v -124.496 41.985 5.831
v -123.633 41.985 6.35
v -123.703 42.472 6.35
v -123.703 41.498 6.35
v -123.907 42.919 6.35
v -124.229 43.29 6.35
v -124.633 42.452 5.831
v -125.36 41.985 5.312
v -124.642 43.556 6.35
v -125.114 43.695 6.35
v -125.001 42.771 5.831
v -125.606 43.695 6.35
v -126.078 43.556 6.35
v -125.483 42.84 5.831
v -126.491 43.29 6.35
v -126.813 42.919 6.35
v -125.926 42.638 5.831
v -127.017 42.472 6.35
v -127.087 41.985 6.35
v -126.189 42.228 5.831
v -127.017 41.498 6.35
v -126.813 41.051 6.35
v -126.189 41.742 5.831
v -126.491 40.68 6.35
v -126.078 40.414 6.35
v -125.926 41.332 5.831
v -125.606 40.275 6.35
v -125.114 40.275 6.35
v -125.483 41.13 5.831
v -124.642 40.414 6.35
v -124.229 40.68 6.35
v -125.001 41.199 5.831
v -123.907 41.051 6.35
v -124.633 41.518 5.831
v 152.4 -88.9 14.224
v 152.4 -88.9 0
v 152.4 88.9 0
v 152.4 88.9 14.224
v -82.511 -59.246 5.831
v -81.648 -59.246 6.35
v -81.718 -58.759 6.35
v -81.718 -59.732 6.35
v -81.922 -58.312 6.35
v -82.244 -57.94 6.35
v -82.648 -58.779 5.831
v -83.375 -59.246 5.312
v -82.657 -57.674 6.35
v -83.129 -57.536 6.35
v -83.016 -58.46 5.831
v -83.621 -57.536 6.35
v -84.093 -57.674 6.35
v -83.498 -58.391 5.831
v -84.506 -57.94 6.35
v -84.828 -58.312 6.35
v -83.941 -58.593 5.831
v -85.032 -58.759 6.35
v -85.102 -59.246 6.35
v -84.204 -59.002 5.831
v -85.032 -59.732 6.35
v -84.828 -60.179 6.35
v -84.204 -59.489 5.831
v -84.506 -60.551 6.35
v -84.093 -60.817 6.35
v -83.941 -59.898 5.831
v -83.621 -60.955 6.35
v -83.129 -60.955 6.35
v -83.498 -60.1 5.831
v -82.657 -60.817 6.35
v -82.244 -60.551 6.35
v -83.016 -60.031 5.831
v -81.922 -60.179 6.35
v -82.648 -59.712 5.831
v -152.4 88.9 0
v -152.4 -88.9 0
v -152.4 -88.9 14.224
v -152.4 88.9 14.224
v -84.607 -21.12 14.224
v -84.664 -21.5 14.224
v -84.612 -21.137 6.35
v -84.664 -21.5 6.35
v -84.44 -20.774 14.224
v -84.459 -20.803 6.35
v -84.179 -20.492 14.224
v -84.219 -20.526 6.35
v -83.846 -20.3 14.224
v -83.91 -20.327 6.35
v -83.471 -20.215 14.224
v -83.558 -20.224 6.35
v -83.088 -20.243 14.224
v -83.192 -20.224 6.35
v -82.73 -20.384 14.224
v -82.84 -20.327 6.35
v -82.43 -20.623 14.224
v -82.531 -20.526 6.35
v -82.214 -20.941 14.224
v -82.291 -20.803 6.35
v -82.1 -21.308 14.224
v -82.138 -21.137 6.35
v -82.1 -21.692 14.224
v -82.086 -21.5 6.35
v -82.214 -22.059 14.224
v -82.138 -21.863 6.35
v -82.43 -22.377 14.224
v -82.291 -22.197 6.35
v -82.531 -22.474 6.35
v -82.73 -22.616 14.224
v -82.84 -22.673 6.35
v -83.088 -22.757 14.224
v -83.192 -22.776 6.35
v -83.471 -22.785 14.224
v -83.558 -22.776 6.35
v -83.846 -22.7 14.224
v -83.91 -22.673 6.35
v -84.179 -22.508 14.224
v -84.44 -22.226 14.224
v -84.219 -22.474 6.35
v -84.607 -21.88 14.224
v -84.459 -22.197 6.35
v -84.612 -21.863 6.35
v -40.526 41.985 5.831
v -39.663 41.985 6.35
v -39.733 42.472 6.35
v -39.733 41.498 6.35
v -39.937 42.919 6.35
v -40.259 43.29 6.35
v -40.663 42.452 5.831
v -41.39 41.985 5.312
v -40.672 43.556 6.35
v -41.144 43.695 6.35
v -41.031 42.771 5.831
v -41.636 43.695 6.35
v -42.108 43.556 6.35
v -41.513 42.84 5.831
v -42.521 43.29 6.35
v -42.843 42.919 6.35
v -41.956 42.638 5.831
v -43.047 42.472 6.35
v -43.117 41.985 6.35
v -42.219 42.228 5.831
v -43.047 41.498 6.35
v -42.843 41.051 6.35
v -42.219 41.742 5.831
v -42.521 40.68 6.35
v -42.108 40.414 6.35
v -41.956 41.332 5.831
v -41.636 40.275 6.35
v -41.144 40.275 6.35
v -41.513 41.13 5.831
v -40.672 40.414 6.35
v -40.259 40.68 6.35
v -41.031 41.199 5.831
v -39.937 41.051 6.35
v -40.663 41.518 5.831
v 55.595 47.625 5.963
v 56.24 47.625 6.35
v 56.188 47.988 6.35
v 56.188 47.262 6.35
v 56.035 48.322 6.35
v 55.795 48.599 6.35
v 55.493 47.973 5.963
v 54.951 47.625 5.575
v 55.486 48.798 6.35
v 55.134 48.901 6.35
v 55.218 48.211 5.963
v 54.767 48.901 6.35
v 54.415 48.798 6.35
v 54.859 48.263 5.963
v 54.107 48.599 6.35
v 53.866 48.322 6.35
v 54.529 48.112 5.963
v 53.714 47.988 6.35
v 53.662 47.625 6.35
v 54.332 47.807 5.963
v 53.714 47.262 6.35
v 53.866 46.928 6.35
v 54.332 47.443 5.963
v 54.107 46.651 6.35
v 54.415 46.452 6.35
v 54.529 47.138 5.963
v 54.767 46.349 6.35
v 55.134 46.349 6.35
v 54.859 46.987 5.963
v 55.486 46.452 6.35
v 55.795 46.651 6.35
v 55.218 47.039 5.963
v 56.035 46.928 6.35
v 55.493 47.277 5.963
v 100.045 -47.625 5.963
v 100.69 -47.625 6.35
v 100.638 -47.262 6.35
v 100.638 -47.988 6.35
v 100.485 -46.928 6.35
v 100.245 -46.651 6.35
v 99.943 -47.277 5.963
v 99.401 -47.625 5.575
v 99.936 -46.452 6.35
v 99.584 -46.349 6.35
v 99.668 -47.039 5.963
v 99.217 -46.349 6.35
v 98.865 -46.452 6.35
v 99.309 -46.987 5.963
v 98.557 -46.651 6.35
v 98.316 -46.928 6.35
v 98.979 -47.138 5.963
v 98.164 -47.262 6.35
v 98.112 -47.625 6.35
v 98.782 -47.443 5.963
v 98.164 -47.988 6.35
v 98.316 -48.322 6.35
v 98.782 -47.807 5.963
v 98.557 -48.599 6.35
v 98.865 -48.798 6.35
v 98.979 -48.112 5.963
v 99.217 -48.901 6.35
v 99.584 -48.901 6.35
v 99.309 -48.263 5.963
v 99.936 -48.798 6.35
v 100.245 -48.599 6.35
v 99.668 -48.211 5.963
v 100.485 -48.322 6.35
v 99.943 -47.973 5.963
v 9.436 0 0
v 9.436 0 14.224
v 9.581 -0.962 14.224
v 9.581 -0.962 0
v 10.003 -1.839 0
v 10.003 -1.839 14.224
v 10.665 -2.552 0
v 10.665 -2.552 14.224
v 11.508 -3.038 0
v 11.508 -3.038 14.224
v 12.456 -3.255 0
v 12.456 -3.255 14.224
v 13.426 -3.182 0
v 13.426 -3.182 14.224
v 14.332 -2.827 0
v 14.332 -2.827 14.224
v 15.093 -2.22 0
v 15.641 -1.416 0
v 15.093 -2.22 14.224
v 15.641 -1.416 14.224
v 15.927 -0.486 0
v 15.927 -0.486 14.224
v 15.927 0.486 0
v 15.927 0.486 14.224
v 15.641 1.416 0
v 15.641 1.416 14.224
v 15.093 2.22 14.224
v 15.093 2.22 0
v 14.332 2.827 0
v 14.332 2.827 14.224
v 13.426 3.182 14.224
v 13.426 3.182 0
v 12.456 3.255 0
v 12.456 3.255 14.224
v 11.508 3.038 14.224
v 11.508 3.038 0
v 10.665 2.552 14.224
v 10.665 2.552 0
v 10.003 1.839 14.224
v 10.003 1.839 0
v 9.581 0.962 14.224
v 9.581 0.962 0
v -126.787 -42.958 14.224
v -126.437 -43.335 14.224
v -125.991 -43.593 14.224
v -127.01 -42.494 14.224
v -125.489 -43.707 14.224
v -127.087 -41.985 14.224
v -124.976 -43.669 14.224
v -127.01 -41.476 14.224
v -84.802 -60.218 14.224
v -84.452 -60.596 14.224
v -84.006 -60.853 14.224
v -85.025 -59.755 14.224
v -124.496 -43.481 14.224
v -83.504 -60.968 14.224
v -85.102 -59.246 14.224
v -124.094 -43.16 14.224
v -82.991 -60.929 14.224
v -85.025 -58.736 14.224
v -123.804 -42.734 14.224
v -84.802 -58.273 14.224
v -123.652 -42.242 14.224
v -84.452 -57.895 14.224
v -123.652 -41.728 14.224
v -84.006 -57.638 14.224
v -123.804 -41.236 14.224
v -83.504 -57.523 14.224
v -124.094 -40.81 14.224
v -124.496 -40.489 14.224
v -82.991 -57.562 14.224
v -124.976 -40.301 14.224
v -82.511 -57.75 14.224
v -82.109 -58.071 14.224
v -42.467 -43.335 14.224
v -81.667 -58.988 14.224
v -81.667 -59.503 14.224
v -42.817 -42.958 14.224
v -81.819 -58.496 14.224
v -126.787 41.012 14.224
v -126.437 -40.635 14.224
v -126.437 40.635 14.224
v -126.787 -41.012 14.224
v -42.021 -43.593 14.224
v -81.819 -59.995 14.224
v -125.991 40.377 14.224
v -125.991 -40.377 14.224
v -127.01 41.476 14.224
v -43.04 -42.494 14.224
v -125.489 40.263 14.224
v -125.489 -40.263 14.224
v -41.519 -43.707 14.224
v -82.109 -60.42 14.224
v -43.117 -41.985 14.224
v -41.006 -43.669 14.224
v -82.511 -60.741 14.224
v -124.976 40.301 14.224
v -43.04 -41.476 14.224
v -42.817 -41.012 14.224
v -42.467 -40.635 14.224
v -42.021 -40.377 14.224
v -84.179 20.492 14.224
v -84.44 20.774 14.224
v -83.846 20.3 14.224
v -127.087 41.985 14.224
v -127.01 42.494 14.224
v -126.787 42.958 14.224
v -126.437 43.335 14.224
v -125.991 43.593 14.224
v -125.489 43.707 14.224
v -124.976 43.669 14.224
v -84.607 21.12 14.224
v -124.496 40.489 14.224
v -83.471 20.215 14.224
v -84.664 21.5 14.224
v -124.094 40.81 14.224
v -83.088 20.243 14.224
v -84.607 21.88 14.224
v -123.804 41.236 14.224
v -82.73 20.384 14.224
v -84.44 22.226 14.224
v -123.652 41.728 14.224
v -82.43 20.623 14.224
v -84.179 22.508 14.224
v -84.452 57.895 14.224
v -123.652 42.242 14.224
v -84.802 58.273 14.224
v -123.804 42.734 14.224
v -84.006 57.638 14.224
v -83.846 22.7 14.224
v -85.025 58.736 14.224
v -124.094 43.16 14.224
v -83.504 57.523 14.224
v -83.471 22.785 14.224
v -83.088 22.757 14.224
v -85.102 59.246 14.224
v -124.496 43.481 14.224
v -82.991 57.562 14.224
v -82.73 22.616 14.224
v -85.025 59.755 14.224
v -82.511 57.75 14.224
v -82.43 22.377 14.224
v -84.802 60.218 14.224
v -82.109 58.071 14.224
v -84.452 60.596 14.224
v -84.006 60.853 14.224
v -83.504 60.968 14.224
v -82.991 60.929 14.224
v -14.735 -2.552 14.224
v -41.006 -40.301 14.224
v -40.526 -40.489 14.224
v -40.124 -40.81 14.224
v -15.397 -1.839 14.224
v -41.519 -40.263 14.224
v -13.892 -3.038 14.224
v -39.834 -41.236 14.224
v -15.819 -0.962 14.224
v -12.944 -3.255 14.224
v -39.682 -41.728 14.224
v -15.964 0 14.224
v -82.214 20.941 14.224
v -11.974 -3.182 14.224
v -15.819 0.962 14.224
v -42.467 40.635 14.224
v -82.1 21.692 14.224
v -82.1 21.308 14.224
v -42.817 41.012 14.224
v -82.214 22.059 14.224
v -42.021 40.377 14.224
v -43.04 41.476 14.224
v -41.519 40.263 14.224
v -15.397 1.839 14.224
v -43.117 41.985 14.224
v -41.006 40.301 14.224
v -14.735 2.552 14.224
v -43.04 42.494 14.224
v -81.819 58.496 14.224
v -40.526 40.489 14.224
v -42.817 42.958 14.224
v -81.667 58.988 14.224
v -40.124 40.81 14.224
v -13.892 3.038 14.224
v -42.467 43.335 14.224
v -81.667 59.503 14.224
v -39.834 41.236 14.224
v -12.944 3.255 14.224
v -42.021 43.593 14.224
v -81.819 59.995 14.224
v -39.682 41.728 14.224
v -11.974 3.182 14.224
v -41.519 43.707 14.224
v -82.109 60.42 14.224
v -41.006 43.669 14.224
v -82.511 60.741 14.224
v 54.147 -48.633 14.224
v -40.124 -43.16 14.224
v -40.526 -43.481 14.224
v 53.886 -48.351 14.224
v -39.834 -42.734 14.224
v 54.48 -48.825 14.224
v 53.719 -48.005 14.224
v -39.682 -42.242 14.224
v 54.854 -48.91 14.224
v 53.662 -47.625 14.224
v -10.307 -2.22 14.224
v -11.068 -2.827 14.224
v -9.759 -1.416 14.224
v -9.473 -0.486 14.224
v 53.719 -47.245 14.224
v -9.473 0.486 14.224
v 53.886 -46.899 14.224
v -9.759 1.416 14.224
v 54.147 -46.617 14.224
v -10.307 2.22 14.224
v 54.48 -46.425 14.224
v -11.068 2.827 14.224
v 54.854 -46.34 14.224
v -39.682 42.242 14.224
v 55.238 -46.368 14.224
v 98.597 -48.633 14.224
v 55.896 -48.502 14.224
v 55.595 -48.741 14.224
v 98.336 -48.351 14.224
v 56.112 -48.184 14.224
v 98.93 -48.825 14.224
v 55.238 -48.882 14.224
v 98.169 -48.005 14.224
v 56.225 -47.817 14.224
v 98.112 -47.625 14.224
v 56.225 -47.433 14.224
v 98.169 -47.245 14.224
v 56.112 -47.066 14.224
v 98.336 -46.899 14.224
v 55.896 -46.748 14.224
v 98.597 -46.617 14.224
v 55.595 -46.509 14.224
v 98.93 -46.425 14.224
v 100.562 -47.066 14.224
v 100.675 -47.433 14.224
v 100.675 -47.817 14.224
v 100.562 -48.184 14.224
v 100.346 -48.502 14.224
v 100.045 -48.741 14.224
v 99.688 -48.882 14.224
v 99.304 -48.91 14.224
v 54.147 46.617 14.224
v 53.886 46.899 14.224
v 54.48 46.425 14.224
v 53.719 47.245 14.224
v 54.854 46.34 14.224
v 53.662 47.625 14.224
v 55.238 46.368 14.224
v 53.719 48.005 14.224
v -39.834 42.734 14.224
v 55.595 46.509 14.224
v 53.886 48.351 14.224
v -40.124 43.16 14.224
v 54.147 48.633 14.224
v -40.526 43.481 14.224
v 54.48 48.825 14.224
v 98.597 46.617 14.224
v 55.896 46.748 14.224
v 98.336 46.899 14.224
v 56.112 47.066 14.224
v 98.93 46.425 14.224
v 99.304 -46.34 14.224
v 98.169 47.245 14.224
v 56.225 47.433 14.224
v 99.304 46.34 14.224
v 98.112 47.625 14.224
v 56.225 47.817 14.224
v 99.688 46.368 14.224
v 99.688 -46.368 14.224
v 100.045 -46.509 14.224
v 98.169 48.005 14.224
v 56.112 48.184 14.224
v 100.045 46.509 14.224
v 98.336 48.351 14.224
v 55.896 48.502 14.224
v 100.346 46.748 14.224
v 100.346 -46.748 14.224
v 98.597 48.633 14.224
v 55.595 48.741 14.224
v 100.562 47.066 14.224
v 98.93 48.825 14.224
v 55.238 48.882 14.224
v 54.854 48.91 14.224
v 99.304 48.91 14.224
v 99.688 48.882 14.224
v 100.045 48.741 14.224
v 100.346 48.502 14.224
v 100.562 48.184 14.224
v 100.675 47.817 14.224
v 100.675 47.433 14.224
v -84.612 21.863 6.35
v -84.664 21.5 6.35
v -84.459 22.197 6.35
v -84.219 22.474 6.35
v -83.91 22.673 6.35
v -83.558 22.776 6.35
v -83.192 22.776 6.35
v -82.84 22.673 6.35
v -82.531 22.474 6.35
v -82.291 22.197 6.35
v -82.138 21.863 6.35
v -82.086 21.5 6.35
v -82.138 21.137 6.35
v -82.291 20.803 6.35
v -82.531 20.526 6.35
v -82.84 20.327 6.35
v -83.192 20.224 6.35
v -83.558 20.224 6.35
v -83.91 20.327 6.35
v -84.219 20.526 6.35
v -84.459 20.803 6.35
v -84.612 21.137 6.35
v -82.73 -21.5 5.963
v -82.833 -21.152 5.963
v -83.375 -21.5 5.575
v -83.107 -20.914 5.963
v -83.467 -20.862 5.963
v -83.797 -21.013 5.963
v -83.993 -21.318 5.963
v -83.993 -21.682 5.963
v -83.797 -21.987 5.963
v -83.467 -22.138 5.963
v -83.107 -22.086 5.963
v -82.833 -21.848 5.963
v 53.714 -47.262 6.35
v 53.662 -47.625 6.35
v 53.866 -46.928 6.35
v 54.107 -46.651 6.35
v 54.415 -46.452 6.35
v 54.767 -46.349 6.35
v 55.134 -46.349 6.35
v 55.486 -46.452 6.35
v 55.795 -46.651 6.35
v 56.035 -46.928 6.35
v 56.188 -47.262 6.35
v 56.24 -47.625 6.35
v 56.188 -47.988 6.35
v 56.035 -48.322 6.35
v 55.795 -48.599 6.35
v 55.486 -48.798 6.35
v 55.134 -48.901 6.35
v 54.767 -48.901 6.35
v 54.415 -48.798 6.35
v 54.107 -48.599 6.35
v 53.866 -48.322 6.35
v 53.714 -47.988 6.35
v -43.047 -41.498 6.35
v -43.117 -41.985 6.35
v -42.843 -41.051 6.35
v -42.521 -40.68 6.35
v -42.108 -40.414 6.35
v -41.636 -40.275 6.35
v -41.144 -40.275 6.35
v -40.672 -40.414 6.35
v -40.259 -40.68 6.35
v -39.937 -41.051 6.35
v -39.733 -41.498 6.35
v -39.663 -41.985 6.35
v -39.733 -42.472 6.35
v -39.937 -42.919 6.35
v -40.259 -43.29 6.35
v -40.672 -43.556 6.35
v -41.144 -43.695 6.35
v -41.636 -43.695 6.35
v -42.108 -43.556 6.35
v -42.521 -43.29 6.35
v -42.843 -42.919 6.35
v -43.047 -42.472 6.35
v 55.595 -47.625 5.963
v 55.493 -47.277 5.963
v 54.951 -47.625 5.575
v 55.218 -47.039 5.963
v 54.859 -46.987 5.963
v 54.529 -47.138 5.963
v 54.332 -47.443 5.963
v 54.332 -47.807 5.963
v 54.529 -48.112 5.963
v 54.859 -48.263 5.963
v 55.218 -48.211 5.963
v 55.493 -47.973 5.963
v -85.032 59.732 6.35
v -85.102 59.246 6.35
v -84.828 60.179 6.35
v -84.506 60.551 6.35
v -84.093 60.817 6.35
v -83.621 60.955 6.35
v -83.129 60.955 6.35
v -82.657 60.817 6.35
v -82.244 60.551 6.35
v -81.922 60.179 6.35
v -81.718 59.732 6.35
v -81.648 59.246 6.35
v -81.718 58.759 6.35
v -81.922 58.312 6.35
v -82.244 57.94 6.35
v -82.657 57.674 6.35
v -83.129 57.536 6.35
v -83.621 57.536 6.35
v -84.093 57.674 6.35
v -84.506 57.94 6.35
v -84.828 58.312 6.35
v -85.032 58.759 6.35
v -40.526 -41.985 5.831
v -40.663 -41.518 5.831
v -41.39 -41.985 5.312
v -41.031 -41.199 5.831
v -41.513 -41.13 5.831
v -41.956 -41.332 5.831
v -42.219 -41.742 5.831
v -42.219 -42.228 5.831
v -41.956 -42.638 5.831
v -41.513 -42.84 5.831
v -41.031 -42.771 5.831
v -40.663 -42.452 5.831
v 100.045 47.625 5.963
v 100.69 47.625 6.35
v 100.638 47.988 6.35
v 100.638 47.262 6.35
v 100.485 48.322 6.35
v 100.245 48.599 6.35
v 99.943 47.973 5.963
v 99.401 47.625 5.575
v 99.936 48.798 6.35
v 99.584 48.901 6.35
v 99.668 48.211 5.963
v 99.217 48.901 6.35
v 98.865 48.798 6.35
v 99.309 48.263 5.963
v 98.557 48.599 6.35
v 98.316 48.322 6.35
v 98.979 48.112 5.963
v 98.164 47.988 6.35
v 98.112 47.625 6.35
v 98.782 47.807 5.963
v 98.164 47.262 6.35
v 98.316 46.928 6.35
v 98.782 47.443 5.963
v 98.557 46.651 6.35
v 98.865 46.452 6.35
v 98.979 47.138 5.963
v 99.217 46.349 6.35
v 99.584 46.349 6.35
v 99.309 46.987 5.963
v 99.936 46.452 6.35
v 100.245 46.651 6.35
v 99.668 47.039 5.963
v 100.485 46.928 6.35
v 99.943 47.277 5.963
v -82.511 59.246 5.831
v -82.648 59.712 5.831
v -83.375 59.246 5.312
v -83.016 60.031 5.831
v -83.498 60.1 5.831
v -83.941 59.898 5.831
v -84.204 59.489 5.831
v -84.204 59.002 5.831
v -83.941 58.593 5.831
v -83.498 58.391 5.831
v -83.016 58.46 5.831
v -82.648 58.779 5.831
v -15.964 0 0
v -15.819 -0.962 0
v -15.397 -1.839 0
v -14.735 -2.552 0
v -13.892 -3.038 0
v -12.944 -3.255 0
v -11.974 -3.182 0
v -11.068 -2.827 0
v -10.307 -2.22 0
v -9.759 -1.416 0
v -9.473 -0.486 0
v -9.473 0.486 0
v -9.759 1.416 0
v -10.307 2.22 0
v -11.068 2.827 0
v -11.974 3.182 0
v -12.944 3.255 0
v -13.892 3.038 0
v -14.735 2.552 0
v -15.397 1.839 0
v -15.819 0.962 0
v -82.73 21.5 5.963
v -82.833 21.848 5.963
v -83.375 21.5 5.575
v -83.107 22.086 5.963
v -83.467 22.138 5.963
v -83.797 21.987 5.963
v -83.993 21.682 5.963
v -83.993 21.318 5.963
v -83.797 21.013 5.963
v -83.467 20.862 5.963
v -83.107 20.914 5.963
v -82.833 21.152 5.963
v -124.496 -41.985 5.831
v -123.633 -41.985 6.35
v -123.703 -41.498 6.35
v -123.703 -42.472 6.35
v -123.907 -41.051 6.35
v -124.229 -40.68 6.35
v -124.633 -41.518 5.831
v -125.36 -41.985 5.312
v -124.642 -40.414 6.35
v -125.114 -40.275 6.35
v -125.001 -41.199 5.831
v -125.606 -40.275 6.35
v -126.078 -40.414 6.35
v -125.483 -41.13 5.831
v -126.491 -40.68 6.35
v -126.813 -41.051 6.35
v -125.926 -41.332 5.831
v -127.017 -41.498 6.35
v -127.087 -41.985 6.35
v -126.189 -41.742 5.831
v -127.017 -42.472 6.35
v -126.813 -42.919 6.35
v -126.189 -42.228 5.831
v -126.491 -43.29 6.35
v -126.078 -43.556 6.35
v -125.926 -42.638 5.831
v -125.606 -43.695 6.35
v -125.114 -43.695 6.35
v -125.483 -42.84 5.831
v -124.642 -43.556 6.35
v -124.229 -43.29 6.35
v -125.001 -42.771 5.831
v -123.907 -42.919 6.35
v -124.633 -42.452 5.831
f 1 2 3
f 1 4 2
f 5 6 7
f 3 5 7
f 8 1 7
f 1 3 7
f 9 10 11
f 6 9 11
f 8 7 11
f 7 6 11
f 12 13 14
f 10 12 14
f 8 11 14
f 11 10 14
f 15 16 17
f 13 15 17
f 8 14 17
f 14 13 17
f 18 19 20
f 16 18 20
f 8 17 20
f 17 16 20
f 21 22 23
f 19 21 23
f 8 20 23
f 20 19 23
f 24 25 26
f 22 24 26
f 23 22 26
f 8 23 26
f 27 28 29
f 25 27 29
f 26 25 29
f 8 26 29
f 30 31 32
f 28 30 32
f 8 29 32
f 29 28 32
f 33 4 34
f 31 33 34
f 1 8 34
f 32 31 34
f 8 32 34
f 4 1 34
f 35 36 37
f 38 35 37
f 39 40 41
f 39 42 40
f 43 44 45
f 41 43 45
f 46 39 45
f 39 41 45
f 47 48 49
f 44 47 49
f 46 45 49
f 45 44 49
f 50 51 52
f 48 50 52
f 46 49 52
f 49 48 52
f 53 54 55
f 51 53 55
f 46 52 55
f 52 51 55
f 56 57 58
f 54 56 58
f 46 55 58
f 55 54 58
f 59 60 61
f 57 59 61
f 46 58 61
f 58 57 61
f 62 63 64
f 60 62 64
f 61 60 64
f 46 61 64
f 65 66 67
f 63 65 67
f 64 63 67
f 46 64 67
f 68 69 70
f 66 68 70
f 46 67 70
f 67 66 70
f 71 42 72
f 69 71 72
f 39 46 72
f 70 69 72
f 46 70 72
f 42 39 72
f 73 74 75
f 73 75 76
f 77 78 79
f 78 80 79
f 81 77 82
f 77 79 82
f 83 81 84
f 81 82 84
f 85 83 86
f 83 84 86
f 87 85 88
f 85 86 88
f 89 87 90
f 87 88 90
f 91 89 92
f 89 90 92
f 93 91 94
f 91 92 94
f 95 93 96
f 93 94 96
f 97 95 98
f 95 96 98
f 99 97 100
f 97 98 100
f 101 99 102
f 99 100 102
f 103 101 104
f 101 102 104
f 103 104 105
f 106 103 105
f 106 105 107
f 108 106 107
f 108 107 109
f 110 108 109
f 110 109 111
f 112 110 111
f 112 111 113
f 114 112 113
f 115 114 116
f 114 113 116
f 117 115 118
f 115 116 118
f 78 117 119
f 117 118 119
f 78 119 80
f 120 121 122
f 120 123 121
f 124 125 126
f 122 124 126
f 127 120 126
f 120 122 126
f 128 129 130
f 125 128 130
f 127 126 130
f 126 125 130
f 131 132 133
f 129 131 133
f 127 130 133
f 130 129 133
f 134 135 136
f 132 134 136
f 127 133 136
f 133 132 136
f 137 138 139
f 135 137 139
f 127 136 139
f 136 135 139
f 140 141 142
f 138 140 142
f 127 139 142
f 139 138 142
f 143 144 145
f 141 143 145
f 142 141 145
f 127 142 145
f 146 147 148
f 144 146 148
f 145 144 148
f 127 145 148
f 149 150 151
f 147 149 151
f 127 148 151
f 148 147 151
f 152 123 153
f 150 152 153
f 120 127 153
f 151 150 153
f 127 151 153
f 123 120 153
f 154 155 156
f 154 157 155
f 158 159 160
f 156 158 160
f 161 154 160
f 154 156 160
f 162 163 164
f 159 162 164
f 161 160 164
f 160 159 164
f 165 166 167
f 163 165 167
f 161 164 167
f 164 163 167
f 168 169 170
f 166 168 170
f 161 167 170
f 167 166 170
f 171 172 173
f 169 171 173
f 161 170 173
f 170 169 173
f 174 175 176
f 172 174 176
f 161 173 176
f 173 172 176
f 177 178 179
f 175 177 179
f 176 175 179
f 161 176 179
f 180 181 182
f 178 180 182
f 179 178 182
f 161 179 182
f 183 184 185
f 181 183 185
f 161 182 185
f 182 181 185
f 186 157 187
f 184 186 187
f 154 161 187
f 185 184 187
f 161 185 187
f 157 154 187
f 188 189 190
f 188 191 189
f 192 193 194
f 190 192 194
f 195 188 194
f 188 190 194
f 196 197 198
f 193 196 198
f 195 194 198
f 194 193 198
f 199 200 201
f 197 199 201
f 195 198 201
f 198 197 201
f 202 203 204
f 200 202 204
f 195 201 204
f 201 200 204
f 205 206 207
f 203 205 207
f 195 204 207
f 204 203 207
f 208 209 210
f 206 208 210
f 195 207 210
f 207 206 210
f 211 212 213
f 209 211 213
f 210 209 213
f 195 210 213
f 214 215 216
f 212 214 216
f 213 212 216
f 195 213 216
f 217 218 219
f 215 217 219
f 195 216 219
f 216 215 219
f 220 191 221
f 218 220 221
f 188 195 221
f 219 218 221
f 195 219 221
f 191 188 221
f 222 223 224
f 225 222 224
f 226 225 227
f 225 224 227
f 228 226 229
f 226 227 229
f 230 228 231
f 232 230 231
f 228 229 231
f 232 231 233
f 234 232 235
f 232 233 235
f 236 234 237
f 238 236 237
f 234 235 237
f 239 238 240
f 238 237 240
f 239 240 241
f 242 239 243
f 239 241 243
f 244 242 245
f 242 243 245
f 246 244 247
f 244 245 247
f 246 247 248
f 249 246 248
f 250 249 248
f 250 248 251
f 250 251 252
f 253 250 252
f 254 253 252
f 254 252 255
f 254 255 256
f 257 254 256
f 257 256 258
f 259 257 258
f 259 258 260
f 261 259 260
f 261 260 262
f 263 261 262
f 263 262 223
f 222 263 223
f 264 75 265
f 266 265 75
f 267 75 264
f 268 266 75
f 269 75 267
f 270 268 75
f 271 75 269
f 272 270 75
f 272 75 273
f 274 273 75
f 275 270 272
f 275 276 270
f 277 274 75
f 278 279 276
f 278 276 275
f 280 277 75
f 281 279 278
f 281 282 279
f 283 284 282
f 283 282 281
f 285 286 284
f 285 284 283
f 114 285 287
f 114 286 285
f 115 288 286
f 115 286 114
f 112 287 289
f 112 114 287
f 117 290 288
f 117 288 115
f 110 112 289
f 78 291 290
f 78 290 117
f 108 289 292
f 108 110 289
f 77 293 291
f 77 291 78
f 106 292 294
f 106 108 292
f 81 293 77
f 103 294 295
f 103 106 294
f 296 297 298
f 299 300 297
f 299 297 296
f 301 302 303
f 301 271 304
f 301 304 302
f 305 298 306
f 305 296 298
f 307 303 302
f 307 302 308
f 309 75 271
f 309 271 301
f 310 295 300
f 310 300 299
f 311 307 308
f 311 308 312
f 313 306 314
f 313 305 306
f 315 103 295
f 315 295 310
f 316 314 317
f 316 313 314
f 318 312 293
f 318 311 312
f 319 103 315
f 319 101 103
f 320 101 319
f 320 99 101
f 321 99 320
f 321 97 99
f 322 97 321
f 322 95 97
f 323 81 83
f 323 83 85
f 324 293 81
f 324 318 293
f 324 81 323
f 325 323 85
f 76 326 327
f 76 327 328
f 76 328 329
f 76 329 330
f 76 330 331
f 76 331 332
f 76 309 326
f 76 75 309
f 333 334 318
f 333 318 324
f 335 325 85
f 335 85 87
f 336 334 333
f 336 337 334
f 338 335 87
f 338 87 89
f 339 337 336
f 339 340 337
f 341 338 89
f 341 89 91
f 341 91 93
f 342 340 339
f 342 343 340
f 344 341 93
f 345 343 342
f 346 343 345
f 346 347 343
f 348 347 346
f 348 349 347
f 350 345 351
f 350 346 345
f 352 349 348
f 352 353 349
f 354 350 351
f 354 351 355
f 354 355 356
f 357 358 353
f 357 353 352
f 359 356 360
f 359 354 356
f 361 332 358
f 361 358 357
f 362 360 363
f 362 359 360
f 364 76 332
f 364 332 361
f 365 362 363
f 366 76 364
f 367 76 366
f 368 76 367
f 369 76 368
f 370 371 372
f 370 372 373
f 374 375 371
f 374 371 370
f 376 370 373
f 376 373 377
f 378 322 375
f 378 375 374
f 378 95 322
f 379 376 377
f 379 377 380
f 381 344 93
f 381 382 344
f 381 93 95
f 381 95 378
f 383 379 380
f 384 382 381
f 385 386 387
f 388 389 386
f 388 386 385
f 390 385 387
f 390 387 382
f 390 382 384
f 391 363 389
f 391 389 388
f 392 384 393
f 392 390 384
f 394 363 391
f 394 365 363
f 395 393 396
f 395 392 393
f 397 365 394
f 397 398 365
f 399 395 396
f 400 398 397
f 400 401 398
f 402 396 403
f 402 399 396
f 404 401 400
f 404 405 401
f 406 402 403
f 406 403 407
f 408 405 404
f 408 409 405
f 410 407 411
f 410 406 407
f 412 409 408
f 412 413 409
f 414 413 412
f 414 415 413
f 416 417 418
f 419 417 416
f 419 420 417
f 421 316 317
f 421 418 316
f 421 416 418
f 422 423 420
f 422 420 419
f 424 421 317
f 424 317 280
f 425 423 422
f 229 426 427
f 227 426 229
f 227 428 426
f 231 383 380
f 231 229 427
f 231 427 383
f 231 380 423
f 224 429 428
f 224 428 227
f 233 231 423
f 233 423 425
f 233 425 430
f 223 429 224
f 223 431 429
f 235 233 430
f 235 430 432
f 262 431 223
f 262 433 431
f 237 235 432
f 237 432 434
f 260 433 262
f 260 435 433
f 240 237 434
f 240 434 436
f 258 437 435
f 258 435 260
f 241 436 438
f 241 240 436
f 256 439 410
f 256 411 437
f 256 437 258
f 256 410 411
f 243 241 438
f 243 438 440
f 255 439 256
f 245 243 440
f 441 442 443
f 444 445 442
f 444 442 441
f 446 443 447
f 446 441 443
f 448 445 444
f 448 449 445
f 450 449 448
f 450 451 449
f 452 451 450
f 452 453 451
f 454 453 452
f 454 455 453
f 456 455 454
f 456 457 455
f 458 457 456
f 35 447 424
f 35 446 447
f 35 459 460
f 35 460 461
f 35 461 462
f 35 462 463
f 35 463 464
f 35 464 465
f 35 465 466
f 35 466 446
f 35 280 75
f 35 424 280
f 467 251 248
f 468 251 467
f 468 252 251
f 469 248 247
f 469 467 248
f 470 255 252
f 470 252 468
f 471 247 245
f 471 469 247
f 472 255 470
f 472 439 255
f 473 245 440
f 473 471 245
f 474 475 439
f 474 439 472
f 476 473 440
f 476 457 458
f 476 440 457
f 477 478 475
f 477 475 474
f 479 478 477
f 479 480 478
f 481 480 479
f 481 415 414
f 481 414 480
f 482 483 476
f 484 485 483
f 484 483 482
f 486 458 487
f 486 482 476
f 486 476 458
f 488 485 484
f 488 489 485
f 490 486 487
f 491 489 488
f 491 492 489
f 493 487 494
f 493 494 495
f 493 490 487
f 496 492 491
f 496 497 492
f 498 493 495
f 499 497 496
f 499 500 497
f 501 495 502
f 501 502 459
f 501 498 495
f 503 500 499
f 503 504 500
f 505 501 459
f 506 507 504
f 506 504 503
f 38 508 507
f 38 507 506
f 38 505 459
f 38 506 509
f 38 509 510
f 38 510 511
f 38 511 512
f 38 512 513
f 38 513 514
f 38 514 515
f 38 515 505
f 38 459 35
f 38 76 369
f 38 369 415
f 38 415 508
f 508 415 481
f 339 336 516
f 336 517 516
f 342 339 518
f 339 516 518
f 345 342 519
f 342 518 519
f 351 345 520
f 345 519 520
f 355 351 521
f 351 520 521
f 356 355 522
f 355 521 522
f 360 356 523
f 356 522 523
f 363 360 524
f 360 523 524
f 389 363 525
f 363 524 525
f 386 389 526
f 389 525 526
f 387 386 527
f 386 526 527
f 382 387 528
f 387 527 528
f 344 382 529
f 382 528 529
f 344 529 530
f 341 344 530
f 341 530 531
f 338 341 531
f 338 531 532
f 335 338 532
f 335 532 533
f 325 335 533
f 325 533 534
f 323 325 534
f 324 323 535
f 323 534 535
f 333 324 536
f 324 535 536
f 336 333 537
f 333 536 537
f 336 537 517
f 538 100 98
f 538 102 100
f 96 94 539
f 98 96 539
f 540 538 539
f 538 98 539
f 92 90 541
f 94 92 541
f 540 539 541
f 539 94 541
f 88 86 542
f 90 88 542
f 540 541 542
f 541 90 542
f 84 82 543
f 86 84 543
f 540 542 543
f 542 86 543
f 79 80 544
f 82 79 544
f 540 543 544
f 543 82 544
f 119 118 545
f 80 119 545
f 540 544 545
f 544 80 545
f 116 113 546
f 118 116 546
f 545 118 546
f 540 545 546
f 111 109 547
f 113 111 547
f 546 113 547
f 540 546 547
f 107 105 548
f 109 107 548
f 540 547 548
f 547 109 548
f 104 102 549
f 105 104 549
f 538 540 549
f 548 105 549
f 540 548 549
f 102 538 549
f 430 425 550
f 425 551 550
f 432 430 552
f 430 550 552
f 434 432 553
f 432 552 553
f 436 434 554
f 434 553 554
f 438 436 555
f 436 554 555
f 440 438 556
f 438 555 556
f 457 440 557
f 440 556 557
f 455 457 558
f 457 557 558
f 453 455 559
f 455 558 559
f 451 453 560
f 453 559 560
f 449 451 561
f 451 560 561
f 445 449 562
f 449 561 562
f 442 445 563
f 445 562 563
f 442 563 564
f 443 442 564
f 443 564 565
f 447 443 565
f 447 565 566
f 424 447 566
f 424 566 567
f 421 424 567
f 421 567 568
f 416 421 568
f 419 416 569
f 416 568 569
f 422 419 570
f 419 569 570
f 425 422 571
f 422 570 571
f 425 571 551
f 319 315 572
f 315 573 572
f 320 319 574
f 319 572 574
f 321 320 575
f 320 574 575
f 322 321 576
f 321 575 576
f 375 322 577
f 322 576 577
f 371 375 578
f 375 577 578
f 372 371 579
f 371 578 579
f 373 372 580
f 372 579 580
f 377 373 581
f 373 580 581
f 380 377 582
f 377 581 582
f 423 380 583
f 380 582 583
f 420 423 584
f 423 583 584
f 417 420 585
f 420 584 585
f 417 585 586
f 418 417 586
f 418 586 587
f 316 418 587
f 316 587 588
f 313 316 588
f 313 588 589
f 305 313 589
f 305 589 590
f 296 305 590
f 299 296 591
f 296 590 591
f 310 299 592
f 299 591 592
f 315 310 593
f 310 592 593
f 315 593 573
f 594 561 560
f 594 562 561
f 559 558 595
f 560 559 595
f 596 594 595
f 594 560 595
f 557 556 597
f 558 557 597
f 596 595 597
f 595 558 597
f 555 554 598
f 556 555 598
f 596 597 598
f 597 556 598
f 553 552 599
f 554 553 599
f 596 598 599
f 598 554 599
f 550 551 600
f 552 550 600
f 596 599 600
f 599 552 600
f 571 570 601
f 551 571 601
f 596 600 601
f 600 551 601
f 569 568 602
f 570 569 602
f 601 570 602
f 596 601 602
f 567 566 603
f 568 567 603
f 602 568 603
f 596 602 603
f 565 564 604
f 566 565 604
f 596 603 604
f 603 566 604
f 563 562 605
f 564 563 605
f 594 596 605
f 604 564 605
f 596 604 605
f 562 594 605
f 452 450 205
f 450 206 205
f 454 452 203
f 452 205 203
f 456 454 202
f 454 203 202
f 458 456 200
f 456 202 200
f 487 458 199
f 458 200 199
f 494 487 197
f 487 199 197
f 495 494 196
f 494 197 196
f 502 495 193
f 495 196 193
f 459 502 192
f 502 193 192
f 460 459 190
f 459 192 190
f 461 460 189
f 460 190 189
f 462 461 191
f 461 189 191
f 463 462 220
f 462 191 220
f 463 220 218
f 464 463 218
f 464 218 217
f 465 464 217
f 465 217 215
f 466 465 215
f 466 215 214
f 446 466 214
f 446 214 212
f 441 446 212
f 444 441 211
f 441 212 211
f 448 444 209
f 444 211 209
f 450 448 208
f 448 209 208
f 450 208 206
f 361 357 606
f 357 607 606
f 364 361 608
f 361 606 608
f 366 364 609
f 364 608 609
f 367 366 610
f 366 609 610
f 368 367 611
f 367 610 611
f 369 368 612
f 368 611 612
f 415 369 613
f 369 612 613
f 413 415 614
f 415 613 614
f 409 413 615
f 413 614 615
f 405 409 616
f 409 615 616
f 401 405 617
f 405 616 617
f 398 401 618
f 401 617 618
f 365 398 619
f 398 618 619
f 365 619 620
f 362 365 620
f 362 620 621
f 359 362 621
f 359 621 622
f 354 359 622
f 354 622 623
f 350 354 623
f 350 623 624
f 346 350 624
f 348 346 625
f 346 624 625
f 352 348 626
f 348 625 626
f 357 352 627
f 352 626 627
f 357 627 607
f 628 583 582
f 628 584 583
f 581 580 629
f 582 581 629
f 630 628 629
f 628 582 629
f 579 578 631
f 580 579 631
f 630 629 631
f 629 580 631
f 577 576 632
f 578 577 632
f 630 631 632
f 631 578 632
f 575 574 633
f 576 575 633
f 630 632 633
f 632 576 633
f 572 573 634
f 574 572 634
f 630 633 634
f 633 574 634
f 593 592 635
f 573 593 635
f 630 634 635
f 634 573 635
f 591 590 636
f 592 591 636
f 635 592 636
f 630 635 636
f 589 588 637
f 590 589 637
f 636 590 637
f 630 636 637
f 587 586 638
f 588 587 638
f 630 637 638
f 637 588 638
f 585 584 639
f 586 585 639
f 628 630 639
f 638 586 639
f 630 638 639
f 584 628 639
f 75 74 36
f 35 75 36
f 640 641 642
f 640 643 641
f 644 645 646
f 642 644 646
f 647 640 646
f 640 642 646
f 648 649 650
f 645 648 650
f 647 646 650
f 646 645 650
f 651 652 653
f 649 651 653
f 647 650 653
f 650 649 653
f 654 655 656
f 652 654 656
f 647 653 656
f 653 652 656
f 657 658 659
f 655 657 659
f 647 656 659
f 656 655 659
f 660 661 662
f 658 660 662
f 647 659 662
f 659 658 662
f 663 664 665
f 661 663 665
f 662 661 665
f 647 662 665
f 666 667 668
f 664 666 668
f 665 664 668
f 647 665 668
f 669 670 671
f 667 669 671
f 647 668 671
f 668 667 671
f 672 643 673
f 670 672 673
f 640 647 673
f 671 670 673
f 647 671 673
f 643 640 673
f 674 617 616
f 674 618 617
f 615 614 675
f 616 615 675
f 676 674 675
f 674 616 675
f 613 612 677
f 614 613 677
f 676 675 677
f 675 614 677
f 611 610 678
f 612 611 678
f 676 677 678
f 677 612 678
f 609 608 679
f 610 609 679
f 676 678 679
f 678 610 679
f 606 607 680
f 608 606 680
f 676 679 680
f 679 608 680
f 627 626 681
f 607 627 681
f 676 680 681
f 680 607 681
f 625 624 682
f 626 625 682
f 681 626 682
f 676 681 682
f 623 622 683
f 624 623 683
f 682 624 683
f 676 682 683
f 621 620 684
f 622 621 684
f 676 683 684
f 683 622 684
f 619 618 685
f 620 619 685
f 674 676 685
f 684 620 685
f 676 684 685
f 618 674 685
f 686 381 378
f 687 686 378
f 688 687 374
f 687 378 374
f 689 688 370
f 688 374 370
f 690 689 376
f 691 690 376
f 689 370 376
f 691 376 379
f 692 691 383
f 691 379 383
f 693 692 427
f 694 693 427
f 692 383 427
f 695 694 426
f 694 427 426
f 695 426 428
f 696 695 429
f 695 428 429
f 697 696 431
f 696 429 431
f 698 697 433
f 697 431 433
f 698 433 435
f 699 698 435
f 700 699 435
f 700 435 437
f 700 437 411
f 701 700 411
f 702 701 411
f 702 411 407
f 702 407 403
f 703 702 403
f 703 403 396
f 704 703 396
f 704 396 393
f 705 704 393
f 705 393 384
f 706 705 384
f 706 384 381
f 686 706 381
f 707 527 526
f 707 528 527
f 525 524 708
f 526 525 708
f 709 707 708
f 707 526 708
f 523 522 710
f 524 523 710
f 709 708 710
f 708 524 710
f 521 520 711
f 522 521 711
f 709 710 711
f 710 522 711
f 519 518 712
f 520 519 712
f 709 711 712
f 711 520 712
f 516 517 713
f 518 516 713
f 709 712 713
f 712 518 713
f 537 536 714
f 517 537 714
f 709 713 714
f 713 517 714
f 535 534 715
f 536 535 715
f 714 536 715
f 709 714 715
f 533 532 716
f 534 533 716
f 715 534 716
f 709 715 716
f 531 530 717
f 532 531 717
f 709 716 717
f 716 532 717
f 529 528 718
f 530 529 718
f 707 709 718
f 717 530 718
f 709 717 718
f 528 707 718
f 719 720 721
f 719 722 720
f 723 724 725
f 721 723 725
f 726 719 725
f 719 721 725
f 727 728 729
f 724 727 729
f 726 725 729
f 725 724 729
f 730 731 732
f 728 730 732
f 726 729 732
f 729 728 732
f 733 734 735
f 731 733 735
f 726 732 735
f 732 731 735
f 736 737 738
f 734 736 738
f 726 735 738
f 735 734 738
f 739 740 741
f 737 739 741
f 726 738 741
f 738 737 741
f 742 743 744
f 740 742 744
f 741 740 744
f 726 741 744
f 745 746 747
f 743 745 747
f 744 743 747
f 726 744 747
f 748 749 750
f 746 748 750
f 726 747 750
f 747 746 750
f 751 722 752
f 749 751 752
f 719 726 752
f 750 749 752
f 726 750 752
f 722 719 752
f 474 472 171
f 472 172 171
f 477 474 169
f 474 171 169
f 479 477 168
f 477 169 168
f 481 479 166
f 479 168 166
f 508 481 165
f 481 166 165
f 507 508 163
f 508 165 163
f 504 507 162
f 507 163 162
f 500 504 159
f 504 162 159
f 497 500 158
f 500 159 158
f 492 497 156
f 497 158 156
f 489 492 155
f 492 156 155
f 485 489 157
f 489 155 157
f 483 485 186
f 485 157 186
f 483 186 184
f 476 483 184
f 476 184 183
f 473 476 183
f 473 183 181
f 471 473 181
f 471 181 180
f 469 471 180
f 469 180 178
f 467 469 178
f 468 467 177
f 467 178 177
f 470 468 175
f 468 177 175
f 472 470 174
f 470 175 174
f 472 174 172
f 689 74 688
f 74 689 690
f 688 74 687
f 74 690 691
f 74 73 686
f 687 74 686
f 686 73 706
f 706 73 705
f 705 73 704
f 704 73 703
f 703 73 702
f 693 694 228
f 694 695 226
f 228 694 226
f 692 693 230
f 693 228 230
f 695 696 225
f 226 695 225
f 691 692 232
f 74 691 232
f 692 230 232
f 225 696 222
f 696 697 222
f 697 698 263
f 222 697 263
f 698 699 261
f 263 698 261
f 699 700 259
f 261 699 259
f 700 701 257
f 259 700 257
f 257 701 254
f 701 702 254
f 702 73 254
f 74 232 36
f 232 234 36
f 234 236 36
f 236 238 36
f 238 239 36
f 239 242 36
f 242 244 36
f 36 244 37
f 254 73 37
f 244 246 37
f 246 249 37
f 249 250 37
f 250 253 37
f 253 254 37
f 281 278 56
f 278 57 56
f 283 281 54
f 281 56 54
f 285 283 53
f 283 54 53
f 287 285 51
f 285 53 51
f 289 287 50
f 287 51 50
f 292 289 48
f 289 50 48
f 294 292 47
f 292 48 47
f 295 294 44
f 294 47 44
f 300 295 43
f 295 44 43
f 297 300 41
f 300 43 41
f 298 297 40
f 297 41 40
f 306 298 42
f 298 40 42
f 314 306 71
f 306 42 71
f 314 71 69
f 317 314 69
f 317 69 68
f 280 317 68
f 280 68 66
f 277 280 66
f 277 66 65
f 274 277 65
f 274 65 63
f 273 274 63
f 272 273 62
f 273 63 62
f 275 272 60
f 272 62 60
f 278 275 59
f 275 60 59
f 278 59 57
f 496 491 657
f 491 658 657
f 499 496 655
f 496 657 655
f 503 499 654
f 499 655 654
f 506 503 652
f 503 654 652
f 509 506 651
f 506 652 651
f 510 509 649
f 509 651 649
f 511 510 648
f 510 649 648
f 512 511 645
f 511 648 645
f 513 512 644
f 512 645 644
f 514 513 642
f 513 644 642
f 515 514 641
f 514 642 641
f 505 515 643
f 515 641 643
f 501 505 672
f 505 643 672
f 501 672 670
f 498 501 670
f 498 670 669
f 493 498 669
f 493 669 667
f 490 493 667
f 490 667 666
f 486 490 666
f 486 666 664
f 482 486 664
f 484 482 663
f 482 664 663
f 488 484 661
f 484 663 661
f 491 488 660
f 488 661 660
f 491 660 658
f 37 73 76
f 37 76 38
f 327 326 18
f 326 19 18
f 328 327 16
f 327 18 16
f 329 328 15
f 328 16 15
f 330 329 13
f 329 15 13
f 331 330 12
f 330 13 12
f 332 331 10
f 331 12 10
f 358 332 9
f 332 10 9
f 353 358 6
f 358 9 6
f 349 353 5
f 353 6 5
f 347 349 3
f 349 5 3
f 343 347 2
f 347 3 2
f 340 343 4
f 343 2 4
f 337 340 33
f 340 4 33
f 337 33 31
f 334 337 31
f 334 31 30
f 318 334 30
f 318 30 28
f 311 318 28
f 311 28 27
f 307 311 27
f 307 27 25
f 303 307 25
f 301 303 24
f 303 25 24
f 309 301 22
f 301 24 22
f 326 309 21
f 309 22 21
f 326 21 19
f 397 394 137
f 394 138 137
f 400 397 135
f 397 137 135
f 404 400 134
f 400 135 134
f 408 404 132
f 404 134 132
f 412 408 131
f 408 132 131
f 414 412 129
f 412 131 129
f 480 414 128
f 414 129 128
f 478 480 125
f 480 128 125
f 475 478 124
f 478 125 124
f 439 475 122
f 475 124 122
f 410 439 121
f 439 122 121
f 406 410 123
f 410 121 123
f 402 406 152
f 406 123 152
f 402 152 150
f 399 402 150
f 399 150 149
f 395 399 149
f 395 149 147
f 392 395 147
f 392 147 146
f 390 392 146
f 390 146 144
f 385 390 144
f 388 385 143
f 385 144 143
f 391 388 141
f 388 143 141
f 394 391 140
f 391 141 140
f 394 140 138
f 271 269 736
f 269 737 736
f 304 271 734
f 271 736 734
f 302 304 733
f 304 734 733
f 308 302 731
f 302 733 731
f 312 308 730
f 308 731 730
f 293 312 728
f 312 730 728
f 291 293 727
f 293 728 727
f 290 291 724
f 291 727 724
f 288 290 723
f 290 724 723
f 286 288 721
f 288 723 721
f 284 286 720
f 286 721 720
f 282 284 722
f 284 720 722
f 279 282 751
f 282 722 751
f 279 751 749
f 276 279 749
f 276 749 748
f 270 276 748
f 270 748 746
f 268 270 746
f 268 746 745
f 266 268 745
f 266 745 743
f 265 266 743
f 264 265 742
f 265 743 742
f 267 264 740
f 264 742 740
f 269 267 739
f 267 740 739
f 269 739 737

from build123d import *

# Parameters (mm, degrees)
SKETCH1_W                     = 304.8
SKETCH1_H                     = 177.8
BOSS_EXTRUDE1_DEPTH           = 14.224
TAP_DRILL_FOR_8_32_TAP1_D     = 3.4544
TAP_DRILL_FOR_8_32_TAP1_DEPTH = 7.874
TAP_DRILL_FOR_8_32_TAP1_TIP   = 1.037806461
TAP_DRILL_FOR_5_40_TAP1_D     = 2.5781
TAP_DRILL_FOR_5_40_TAP1_DEPTH = 7.874
TAP_DRILL_FOR_5_40_TAP1_TIP   = 0.774539381
F_1_4_CLEARANCE_HOLE1_D       = 6.5278


with BuildPart() as part:
    # Sketch1 → Boss-Extrude1 (new body)
    with BuildSketch(Plane.XY):
        Rectangle(SKETCH1_W, SKETCH1_H)
    extrude(amount=BOSS_EXTRUDE1_DEPTH)

    # Tap Drill for #8-32 Tap1
    with Locations(Plane.XY.offset(14.224)):
        with Locations((-41.39, 41.985), (-41.39, -41.985), (-125.36, -41.985), (-125.36, 41.985), (-83.375, 59.2455), (-83.375, -59.2455)):
            Hole(TAP_DRILL_FOR_8_32_TAP1_D / 2, depth=TAP_DRILL_FOR_8_32_TAP1_DEPTH)
            with Locations((0, 0, -(TAP_DRILL_FOR_8_32_TAP1_DEPTH + TAP_DRILL_FOR_8_32_TAP1_TIP / 2))):  # 118° drill point
                Cone(0, TAP_DRILL_FOR_8_32_TAP1_D / 2, TAP_DRILL_FOR_8_32_TAP1_TIP, mode=Mode.SUBTRACT)

    # Tap Drill for #5-40 Tap1
    with Locations(Plane.XY.offset(14.224)):
        with Locations((-83.375, 21.5), (-83.375, -21.5), (54.950719391, 47.625), (99.400719391, 47.625), (99.400719391, -47.625), (54.950719391, -47.625)):
            Hole(TAP_DRILL_FOR_5_40_TAP1_D / 2, depth=TAP_DRILL_FOR_5_40_TAP1_DEPTH)
            with Locations((0, 0, -(TAP_DRILL_FOR_5_40_TAP1_DEPTH + TAP_DRILL_FOR_5_40_TAP1_TIP / 2))):  # 118° drill point
                Cone(0, TAP_DRILL_FOR_5_40_TAP1_D / 2, TAP_DRILL_FOR_5_40_TAP1_TIP, mode=Mode.SUBTRACT)

    # 1/4 Clearance Hole1 (through all)
    with Locations(Plane(origin=(0, 0, 0), x_dir=(1, 0, 0), z_dir=(0, 0, -1))):
        with Locations((-12.7, 0), (12.7, 0)):
            Hole(F_1_4_CLEARANCE_HOLE1_D / 2)


solid = part.part
